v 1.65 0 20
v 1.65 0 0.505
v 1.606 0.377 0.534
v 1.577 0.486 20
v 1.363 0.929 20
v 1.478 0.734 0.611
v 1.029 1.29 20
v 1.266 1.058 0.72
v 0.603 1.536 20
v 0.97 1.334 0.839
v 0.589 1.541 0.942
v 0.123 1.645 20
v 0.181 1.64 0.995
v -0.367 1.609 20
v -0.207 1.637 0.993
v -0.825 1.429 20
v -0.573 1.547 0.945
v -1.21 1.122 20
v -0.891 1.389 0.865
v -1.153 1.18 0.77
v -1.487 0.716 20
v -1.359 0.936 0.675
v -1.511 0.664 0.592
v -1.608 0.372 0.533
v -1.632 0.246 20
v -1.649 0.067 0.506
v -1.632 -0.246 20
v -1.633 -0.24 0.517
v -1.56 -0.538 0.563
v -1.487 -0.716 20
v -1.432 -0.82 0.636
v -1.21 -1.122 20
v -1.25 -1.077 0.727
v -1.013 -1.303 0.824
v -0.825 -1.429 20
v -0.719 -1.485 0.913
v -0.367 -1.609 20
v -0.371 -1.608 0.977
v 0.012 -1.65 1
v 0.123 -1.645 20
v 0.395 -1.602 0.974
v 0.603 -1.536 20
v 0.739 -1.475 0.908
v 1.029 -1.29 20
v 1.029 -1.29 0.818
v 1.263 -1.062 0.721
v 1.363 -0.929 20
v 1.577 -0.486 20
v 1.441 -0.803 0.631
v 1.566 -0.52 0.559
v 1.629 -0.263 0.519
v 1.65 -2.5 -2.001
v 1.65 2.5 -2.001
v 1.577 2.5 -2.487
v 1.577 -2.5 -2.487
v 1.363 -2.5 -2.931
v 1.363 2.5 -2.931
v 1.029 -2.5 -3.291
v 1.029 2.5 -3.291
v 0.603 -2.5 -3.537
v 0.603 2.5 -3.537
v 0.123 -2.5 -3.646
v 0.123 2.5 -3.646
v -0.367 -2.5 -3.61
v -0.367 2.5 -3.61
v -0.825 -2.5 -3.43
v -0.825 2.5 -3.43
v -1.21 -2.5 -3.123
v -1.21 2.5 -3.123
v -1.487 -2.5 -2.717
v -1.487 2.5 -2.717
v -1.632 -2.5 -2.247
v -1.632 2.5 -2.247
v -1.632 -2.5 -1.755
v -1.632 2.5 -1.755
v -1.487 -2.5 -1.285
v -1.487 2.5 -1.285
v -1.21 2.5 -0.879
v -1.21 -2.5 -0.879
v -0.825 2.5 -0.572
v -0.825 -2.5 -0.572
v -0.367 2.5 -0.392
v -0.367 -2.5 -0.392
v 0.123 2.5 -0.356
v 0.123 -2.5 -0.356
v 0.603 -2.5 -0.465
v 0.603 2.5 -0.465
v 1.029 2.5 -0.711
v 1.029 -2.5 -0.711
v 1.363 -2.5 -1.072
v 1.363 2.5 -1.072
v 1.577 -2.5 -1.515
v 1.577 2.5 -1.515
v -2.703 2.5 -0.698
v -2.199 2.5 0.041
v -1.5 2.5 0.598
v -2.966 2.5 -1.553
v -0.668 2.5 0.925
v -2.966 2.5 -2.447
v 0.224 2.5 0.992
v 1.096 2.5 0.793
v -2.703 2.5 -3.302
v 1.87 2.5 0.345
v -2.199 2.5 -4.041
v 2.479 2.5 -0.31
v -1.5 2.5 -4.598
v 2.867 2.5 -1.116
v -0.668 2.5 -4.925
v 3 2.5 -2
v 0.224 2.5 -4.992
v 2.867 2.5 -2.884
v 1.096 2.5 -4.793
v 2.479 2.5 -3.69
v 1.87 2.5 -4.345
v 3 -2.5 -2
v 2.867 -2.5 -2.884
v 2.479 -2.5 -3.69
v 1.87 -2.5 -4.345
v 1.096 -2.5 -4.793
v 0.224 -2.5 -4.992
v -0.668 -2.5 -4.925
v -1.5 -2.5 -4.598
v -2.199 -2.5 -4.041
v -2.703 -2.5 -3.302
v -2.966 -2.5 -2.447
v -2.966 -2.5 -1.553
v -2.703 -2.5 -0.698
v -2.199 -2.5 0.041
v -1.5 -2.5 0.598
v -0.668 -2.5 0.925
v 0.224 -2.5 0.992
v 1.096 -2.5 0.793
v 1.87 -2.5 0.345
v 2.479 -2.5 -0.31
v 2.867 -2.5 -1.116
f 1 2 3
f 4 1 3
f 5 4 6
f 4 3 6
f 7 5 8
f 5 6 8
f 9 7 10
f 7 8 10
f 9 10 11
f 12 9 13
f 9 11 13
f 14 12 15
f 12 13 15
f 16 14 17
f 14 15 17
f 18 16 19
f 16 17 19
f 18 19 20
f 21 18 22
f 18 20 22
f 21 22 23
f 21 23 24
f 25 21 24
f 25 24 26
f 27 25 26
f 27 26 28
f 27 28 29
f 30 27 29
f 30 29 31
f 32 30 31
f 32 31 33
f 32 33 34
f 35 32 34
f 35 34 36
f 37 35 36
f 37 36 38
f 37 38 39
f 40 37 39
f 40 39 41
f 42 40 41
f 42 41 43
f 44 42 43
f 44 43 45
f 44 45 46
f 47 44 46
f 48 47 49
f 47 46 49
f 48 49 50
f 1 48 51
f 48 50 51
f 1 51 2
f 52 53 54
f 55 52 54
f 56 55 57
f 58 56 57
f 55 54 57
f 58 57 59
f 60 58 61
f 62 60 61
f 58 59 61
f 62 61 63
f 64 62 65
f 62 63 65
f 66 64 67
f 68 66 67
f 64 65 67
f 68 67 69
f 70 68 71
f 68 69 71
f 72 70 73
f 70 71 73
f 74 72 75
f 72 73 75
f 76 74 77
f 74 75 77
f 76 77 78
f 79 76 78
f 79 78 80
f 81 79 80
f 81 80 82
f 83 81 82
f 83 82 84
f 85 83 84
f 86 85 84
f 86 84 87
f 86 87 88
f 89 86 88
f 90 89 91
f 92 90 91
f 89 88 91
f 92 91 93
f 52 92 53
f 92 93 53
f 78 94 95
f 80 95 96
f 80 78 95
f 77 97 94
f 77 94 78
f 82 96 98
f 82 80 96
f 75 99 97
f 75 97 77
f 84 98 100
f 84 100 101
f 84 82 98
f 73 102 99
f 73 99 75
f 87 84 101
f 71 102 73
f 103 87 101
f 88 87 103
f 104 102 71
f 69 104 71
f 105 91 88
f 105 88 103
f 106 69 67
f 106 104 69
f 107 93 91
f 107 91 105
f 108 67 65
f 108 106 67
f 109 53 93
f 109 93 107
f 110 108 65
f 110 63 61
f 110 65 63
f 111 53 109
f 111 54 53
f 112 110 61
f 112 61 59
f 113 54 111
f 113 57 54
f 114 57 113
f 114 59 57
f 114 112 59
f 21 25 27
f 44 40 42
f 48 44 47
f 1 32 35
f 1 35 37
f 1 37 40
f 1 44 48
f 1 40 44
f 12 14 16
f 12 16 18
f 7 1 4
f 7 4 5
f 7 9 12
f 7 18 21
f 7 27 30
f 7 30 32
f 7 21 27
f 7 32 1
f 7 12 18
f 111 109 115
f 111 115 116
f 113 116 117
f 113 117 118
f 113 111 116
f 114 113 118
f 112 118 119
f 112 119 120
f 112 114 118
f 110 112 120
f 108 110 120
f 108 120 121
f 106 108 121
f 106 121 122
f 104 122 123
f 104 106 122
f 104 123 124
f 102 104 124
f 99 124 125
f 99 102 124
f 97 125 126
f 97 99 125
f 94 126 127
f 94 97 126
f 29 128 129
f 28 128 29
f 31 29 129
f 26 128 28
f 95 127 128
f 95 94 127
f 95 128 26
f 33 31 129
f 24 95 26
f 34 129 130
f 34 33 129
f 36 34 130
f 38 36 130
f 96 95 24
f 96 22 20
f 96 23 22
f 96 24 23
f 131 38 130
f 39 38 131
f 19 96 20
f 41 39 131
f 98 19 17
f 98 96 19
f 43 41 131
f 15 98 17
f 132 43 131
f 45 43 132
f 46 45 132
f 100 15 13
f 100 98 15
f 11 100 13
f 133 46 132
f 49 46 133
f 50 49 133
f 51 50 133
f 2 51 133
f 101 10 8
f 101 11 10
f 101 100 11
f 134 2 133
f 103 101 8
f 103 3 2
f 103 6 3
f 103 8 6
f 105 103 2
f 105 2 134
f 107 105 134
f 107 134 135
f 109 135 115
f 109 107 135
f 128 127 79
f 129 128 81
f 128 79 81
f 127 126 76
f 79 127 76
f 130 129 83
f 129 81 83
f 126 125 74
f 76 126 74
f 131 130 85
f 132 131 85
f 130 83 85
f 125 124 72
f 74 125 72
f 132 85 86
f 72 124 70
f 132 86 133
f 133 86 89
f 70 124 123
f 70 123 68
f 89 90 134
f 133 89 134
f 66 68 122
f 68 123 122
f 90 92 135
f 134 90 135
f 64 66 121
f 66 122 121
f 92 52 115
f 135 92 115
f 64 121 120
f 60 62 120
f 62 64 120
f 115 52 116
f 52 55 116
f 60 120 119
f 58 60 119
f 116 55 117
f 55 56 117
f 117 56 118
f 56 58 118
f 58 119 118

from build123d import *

# Parameters (mm, degrees)
SKICA1_R                 = 1.65
P_IDAT_VYSUNUT_M1_DEPTH  = 20
SKICA2_R                 = 3
P_IDAT_VYSUNUT_M2_DEPTH  = 2.5
SKICA4_R                 = 1.65
ODEBRAT_VYSUNUT_M1_DEPTH = 5


with BuildPart() as part:
    # Skica1 → Přidat vysunutím1 (new body)
    with BuildSketch(Plane.XY):
        Circle(SKICA1_R)
    extrude(amount=P_IDAT_VYSUNUT_M1_DEPTH)

    # Skica2 → Přidat vysunutím2 (add, symmetric)
    with BuildSketch(Plane(origin=(0, 0, 0), x_dir=(1, 0, 0), z_dir=(0, 1, 0))):
        with Locations((0, 2)):
            Circle(SKICA2_R)
    extrude(amount=P_IDAT_VYSUNUT_M2_DEPTH, both=True)

    # Skica4 → Odebrat vysunutím1 (cut)
    with BuildSketch(Plane(origin=(0, 2.5, 0), x_dir=(1, 0, 0), z_dir=(0, 1, 0))):
        with Locations((0, 2.001079416)):
            Circle(SKICA4_R)
    extrude(amount=-ODEBRAT_VYSUNUT_M1_DEPTH, mode=Mode.SUBTRACT)


solid = part.part
